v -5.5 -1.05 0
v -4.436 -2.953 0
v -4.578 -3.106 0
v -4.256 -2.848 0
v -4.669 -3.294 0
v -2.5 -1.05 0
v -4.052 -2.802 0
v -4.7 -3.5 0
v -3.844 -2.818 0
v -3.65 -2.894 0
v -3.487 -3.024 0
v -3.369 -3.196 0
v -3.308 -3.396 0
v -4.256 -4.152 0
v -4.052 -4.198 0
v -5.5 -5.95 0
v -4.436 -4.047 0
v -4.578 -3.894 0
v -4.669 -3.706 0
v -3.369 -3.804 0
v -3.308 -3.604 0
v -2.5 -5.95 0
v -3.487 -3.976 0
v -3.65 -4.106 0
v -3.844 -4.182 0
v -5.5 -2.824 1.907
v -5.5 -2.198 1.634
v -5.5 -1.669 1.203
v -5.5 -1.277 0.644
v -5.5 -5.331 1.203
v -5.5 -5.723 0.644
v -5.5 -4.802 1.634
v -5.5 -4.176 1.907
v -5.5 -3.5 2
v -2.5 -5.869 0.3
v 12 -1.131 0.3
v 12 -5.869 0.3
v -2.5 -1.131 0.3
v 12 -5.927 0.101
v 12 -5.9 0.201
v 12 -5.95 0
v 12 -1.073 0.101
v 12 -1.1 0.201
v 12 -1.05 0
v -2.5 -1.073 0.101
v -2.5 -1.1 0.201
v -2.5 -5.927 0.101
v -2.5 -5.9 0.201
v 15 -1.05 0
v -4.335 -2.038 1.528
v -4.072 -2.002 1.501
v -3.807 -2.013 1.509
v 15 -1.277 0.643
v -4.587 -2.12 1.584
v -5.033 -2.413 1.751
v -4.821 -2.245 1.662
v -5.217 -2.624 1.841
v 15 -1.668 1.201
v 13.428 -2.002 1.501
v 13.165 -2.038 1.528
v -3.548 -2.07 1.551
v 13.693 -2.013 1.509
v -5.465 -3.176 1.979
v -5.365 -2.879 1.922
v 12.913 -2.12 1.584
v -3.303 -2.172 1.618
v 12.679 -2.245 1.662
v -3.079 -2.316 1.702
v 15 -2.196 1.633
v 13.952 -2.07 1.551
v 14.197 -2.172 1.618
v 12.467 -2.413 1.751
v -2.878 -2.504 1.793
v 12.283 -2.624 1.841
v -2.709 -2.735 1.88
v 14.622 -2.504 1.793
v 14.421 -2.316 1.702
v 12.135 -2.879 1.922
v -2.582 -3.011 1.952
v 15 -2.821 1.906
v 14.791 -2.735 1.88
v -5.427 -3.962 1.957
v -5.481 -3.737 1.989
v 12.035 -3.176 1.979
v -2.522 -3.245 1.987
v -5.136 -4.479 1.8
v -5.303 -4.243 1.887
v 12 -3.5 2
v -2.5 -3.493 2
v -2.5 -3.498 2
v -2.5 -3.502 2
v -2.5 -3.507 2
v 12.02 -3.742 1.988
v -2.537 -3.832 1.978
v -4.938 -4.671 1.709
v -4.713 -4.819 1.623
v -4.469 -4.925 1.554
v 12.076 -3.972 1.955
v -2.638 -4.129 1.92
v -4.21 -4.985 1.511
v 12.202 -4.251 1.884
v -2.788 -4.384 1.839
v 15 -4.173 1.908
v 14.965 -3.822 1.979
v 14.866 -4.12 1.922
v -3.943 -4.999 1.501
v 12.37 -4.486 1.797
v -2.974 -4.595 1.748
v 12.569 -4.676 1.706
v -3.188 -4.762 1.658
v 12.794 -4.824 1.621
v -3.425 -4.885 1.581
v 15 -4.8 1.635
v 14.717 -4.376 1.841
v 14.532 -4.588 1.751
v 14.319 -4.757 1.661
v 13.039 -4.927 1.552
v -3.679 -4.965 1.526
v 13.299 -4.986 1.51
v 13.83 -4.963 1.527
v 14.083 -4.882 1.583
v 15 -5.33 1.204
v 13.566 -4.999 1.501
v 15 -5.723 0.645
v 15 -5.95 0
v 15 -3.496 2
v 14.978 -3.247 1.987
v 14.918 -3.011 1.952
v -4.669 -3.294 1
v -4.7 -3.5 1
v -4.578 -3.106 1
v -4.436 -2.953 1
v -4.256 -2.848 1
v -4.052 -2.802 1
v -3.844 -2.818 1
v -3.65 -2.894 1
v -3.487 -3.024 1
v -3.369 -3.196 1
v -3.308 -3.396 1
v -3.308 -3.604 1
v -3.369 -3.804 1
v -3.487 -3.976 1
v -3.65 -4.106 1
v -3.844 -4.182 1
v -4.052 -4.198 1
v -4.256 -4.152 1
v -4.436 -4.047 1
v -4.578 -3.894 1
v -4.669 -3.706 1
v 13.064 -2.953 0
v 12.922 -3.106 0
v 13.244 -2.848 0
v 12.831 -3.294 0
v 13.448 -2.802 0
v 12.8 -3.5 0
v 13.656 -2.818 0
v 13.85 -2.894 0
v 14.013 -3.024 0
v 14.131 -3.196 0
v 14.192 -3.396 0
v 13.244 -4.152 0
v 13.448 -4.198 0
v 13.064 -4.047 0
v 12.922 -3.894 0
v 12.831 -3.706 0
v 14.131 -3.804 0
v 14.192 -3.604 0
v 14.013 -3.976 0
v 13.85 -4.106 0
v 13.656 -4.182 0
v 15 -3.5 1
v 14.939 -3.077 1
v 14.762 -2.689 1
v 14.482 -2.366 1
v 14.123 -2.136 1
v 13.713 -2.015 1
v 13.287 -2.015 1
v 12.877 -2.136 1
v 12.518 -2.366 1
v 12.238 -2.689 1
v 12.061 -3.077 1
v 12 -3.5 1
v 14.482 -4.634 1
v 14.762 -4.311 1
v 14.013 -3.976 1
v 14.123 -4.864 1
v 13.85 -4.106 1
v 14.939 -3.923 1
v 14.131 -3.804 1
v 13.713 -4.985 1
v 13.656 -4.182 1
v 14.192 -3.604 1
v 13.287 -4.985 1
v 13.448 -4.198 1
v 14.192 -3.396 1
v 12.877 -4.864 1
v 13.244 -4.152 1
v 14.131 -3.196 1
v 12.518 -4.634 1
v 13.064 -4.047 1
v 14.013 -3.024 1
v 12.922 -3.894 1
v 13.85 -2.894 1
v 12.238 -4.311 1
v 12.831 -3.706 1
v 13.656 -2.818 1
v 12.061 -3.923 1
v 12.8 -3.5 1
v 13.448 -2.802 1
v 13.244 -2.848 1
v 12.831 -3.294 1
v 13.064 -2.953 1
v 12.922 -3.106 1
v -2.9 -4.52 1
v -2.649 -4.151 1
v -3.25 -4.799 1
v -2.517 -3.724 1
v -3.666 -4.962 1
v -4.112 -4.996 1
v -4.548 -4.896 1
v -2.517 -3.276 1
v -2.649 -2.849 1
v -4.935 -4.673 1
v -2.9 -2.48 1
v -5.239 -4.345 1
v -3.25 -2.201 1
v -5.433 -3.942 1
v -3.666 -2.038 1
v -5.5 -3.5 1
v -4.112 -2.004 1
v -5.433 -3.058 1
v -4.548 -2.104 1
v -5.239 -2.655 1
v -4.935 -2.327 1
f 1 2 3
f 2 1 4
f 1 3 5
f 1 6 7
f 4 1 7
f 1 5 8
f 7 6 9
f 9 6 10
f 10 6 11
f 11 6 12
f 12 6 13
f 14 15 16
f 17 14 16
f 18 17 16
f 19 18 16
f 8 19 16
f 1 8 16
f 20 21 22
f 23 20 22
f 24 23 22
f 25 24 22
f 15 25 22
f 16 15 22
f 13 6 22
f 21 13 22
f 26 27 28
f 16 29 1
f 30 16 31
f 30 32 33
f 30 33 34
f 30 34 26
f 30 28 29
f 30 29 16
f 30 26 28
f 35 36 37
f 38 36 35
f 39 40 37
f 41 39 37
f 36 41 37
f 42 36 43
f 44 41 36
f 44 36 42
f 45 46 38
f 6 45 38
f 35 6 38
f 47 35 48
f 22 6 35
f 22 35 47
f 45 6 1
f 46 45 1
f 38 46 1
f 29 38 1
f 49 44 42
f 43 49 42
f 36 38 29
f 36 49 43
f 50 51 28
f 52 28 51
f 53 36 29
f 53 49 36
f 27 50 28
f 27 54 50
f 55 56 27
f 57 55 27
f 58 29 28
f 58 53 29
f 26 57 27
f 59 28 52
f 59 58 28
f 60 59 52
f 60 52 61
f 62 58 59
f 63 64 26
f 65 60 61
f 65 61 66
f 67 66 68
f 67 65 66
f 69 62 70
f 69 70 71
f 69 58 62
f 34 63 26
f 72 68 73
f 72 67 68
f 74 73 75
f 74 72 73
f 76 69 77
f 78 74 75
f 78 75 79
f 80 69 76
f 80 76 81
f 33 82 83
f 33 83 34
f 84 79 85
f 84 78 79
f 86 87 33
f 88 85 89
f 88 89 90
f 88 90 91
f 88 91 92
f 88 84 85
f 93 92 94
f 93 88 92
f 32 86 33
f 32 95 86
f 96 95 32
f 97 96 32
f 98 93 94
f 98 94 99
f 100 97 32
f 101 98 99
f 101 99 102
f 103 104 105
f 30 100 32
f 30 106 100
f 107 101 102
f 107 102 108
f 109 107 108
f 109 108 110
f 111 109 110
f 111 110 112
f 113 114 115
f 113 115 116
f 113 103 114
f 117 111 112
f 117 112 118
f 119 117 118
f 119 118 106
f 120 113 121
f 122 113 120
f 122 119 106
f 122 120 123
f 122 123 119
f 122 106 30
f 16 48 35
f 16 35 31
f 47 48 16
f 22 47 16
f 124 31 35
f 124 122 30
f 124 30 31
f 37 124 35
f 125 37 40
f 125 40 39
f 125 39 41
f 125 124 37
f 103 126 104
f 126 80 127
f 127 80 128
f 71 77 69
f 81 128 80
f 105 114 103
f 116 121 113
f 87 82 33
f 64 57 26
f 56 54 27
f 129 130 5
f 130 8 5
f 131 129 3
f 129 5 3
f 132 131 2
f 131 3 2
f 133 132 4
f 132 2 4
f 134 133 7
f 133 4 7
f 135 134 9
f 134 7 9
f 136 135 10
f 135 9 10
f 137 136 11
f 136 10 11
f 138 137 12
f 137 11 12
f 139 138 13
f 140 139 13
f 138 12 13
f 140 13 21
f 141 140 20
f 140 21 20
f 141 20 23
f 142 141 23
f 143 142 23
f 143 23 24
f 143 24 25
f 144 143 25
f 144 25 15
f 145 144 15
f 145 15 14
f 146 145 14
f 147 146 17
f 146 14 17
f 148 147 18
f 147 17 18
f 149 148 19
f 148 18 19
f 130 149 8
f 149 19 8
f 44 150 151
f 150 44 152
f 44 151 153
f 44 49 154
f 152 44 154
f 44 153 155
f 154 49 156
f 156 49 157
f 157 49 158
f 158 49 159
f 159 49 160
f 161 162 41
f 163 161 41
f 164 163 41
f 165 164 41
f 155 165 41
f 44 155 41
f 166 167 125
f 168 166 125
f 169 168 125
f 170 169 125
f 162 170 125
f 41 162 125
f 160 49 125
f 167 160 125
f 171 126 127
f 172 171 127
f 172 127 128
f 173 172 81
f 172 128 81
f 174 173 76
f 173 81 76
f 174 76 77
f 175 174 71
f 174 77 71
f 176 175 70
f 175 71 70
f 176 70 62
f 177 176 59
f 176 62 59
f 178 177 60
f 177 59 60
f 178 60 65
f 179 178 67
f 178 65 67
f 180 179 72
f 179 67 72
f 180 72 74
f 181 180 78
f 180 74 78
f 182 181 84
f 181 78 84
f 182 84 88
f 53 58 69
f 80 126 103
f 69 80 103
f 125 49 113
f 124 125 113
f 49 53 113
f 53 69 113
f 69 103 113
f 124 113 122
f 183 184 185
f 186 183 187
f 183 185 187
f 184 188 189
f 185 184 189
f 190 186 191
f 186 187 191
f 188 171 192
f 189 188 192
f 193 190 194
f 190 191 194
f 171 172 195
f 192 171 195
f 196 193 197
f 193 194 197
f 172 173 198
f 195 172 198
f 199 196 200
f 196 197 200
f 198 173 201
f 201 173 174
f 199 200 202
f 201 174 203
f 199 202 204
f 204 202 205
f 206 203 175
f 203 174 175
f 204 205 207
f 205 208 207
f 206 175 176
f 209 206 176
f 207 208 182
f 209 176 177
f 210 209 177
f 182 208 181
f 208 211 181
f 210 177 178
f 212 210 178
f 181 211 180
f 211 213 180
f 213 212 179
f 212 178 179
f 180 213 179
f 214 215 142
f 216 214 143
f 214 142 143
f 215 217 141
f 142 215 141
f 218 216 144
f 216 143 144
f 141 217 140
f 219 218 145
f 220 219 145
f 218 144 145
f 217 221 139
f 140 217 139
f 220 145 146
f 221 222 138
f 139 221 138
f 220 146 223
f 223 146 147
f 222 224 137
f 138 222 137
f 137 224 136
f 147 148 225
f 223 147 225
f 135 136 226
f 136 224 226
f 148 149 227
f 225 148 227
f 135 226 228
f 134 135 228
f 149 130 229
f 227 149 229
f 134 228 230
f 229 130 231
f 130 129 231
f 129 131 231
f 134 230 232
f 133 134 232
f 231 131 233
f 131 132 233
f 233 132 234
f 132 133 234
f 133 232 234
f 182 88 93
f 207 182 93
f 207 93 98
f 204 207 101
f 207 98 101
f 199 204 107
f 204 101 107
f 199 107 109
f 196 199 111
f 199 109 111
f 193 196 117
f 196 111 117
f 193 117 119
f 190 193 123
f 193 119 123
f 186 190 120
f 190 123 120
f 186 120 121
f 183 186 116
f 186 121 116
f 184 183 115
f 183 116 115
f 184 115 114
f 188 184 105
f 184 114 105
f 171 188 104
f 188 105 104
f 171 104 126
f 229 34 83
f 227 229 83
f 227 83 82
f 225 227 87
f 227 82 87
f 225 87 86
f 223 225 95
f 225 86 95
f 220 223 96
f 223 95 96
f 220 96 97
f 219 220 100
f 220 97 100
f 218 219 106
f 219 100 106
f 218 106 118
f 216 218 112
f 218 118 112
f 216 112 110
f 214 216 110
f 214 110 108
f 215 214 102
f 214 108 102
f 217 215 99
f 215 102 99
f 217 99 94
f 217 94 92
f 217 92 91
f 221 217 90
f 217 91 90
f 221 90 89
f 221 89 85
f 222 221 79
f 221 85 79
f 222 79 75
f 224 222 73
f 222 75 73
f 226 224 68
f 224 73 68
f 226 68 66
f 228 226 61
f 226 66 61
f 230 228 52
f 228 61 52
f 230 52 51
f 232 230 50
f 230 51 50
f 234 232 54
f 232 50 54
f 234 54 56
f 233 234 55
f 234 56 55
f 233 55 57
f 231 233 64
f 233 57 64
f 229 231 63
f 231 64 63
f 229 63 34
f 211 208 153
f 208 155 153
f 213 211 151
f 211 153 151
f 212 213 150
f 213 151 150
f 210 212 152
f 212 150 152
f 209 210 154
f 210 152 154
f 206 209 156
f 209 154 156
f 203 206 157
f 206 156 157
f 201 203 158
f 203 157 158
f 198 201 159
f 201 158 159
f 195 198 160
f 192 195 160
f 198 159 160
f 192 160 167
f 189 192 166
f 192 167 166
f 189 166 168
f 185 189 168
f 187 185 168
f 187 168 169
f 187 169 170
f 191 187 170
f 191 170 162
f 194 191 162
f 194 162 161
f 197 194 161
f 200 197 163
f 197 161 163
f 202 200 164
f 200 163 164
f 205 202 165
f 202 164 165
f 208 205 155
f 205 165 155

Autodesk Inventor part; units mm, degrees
ref_plane "作業平面1" through (15, -6, 0) normal (-1, 0, 0) x (0, -1, 0)
sketch "スケッチ1" plane through (15, -6, 0) normal (-1, 0, 0) x (0, -1, 0)
  arc A0 (-0.0505, 0) -> (-4.9495, 0) centre (-2.5, -0.5) ccw projected
  line L0 (-4.9495, 0) -> (-0.0505, 0) projected
  point P0 (-6, 0)
ref_plane "作業平面2" through (-5.5, -5.9495, 0) normal (1, 0, 0) x (0, 1, 0)
extrude "押し出し1" add sketch "スケッチ1" along normal up to surface (20.5 mm away)
ref_plane "作業平面3" through (12, 0, -1) normal (0, 0, -1) x (-1, 0, 0)
sketch "スケッチ2" plane through (12, 0, 0) normal (0, 0, -1) x (-1, 0, 0)
  line L0 (14.5, -5.9495) -> (17.5, -5.9495) construction
  line L1 (14.5, -1.0505) -> (14.5, -5.9495) construction
  line L2 (17.5, -1.0505) -> (14.5, -1.0505) construction
  line L3 (17.5, -5.9495) -> (17.5, -1.0505) construction
  arc A0 (0, -3) -> (0.5, -3.5) centre (0.5, -3) ccw construction
  line L4 (0.5, -3.5) -> (7.401, -3.5) construction
  arc A1 (7.401, -3.5) -> (7.901, -3) centre (7.401, -3) ccw construction
  line L5 (7.901, -3) -> (7.901, -2.5) construction
  arc A2 (7.901, -2.5) -> (7.401, -2) centre (7.401, -2.5) ccw construction
  line L6 (7.401, -2) -> (0.5, -2) construction
  arc A3 (0.5, -2) -> (0, -2.5) centre (0.5, -2.5) ccw construction
  line L7 (0, -3) -> (0, -2.5) construction
  spline S0 degree 3 poles (8.201, -0.8167) (8.2004, -0.8173) (8.1998, -0.8179) (8.1567, -0.8609) (8.1131, -0.8989) (8.0137, -0.9678) (7.9594, -0.997) (7.8435, -1.0385) (7.7825, -1.0505) (7.721, -1.0505) knots -0.000247 -0.000247 -0.000247 -0.000247 0 0 0.018039 0.018039 0.036793 0.036793 0.055658 0.055658 0.055658 0.055658 construction
  line L8 (8.201, -0.3) -> (8.201, -0.8167) construction
  line L9 (11.7, -0.3) -> (8.201, -0.3) construction
  line L10 (11.7, -4.5) -> (11.7, -0.3) construction
  line L11 (11.7, -4.5) -> (0.3, -4.5) construction
  arc A4 (0.3, -4.5) -> (0, -4.8) centre (0.3, -4.8) ccw construction
  line L12 (0, -5.9495) -> (0, -4.8) construction
  line L13 (-3, -5.9495) -> (0, -5.9495) construction
  line L14 (-3, -1.0505) -> (-3, -5.9495) construction
  line L15 (7.721, -1.0505) -> (-3, -1.0505) construction
  line L16 (17.5, -1.0505) -> (17.5, -5.9495) construction
  line L17 (-3, -1.0505) -> (17.5, -1.0505) construction
  line L18 (-3, -5.9495) -> (-3, -1.0505) construction
  line L19 (-3, -5.9495) -> (17.5, -5.9495) construction
  line L20 (14.5, -5.9495) -> (0, -5.9495)
  line L21 (0, -5.9495) -> (0, -1.0505)
  line L22 (0, -1.0505) -> (14.5, -1.0505)
  line L23 (14.5, -1.0505) -> (14.5, -5.9495)
  circle A5 centre (16, -3.5) radius 0.55 projected
  circle A6 centre (-1.5, -3.5) radius 0.55 projected
  point P0 (12, 0)
extrude "押し出し2" cut sketch "スケッチ2" against normal blind 0.3 contours L20 L21 L22 L23
sketch "スケッチ3" plane through (15, -5.9495, 0) normal (0, 0, -1) x (-1, 0, 0)
  line L0 (17.5, 4.899) -> (17.5, 0) construction
  line L1 (17.5, 0) -> (20.5, 0) construction
  line L2 (20.5, 4.899) -> (20.5, 0) construction
  line L3 (17.5, 4.899) -> (20.5, 4.899) construction
  line L4 (3, 0) -> (3, 4.899) construction
  line L5 (0, 4.899) -> (3, 4.899) construction
  line L6 (0, 0) -> (0, 4.899) construction
  line L7 (0, 0) -> (3, 0) construction
  line L8 (20.5, 0) -> (20.5, 4.899) construction
  line L9 (20.5, 0) -> (17.5, 4.899) construction
  line L10 (17.5, 0) -> (20.5, 0) construction
  line L11 (17.5, 0) -> (20.5, 4.899) construction
  line L12 (0, 0) -> (0, 4.899) construction
  line L13 (3, 4.899) -> (0, 0) construction
  line L14 (0, 4.899) -> (3, 4.899) construction
  line L15 (0, 0) -> (0, 4.899) construction
  line L16 (3, 0) -> (3, 4.899) construction
  line L17 (0, 4.899) -> (3, 0) construction
  circle A0 centre (19, 2.4495) radius 0.7
  circle A1 centre (1.5, 2.4495) radius 0.7
  point P0 (15, 5.9495)
  dimension "d5" = 1.4
extrude "押し出し3" cut sketch "スケッチ3" against normal up to next
ref_plane "作業平面5" through (15, -3.5, 1) normal (0, 0, -1) x (-1, 0, 0)
ref_plane "作業平面4" through (15, -3.5, 2) normal (0, 0, -1) x (-1, 0, 0)
sketch "スケッチ4" plane through (15, -3.5, 2) normal (0, 0, -1) x (-1, 0, 0)
  circle A0 centre (19, 0) radius 1.5
  circle A1 centre (1.5, 0) radius 0.7 projected
  circle A2 centre (1.5, 0) radius 1.5
  circle A3 centre (19, 0) radius 0.7 projected
  point P0 (15, 3.5)
  point P1 (19, 0.7)
  point P2 (1.5, 0.7)
  dimension "d9" = 3
extrude "押し出し4" cut sketch "スケッチ4" along normal up to surface (1 mm away) contours A0 | A1 | A2 | A3
properties part number "SR-T-09"
